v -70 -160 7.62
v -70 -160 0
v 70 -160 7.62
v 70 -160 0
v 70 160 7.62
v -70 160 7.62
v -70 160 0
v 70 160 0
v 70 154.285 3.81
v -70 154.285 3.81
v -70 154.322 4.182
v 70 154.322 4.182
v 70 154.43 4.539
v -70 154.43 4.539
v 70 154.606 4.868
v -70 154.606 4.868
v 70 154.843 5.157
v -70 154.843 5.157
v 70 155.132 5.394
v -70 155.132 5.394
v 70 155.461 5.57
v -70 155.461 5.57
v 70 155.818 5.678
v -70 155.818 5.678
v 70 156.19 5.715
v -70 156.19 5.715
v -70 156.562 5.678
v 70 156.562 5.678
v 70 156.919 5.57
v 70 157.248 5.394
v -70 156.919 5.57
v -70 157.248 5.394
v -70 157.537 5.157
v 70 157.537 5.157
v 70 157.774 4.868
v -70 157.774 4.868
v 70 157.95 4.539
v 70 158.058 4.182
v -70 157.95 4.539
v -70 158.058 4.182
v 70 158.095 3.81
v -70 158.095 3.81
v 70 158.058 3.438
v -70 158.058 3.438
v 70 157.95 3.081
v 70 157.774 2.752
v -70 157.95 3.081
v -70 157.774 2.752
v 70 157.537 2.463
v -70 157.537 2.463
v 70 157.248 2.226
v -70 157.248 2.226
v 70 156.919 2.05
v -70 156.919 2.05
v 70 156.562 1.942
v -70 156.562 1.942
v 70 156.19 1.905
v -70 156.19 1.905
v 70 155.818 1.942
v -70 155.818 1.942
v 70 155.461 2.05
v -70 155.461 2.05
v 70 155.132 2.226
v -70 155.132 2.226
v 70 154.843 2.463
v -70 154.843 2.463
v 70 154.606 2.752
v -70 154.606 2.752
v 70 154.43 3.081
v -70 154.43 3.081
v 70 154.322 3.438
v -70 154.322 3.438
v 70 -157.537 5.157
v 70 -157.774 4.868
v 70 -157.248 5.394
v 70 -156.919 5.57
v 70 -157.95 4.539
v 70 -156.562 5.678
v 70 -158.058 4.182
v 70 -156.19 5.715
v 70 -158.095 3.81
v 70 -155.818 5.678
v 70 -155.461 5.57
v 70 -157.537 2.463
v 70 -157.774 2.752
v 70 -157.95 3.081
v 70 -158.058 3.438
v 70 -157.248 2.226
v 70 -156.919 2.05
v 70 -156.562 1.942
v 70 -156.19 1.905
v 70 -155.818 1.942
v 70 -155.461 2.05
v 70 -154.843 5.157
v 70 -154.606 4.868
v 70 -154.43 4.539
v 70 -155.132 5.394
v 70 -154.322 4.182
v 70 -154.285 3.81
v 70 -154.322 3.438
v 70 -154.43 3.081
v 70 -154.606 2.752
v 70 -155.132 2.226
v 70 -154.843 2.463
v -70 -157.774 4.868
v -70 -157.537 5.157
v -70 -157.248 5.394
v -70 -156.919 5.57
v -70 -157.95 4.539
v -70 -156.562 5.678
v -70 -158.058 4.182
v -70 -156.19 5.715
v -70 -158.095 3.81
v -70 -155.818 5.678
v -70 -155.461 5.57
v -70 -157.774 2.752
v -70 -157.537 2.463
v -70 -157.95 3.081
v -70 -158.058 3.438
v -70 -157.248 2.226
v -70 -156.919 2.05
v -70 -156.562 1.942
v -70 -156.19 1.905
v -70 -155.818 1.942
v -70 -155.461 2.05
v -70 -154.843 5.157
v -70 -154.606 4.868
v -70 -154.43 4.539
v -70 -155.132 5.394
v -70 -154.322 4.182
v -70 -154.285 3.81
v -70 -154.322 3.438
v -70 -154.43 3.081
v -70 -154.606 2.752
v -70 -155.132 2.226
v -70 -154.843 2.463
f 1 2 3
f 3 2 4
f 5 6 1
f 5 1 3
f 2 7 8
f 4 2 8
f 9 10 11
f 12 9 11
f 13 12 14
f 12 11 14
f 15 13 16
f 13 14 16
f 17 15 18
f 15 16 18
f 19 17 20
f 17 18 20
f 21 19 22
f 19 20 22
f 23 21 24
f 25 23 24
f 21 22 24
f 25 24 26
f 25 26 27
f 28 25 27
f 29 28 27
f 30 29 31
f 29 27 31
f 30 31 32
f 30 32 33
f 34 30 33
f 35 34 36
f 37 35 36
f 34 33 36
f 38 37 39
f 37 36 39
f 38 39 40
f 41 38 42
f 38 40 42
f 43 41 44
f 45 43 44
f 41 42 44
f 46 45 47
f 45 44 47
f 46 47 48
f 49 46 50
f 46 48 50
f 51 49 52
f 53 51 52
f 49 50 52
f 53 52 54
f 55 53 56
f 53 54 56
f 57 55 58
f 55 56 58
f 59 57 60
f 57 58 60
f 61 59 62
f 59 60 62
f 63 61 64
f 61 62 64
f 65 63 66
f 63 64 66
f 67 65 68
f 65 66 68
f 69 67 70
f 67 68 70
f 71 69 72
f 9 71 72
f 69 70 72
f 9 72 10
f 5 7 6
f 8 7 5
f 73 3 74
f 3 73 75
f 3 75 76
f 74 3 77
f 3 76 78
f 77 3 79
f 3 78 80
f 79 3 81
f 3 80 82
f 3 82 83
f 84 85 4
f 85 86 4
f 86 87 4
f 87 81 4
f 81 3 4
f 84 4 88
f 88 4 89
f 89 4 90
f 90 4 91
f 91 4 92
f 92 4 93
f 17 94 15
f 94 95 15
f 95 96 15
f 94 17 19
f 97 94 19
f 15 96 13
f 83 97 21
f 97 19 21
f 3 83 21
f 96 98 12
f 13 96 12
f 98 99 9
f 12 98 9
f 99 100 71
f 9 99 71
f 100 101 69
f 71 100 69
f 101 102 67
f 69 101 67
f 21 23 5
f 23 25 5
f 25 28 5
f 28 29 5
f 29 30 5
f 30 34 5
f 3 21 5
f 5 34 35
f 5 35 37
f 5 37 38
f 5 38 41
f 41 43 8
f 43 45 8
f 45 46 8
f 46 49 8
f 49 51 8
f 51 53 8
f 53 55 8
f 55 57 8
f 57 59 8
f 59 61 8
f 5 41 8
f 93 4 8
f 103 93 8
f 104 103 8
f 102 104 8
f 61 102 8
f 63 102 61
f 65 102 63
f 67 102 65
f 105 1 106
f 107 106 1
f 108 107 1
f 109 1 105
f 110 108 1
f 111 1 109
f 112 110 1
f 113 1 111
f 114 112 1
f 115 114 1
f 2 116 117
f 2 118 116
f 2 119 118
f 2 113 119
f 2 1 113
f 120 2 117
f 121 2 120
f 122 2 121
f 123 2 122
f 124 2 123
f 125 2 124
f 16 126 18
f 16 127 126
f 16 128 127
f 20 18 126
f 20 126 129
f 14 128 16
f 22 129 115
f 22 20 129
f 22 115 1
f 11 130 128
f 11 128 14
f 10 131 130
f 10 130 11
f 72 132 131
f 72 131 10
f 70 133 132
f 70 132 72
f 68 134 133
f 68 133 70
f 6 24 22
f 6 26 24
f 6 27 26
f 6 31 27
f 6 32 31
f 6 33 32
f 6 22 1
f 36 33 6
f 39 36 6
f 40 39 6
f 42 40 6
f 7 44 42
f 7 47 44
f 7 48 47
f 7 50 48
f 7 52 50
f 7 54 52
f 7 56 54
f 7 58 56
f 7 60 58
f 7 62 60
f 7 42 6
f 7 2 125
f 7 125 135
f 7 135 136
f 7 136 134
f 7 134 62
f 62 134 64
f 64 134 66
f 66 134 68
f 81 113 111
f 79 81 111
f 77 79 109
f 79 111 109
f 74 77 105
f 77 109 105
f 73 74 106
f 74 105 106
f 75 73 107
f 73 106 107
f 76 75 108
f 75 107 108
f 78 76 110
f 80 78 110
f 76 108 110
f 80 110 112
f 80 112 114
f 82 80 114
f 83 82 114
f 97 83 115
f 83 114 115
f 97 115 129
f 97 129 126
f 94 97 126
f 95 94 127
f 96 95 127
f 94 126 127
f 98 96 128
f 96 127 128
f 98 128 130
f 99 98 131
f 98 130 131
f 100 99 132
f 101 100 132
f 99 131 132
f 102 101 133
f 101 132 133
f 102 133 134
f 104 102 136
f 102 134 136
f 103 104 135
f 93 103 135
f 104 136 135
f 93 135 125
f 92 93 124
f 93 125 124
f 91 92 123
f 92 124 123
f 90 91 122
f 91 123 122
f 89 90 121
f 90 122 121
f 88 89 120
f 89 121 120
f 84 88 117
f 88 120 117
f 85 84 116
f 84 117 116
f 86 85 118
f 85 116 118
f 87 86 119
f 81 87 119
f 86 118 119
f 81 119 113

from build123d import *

# Parameters (mm, degrees)
F0_W     = 140
F0_H     = 320
F1_DEPTH = 7.62
F4_R     = 1.905
F5_DEPTH = 140
F3_R     = 1.905
F6_DEPTH = 140


with BuildPart() as f1:
    # F0 (on Top) → F1 (new body)
    with BuildSketch(Plane.XY):
        Rectangle(F0_W, F0_H)
    extrude(amount=F1_DEPTH)

    # F4 (on face) → F5 (cut)
    with BuildSketch(Plane(origin=(-70, 0, 0), x_dir=(0, -1, 0), z_dir=(-1, 0, 0))):
        with Locations((-156.19, 3.81)):
            Circle(F4_R)
    extrude(amount=-F5_DEPTH, mode=Mode.SUBTRACT)

    # F3 (on face) → F6 (cut)
    with BuildSketch(Plane(origin=(-70, 0, 0), x_dir=(0, -1, 0), z_dir=(-1, 0, 0))):
        with Locations((156.19, 3.81)):
            Circle(F3_R)
    extrude(amount=-F6_DEPTH, mode=Mode.SUBTRACT)


solid = f1.part
